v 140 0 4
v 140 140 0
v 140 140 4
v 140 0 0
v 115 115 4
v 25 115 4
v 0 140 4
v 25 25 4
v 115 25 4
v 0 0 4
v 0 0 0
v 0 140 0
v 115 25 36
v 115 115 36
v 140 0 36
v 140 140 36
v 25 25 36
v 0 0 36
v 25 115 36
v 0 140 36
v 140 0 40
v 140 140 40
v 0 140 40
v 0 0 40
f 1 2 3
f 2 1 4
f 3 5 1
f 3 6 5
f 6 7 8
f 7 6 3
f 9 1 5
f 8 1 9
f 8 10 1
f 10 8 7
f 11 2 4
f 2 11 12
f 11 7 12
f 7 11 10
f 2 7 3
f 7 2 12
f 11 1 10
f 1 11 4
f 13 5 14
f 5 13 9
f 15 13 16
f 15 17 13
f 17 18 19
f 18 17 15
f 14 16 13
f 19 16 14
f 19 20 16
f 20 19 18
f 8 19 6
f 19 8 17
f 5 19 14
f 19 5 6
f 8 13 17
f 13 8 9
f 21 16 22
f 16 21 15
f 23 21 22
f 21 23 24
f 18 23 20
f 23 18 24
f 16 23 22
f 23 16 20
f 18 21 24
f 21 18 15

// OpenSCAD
$fn = 100;
board_size = 140;


cube([board_size,board_size,4]);


battery_out = [90,90,35];

difference(){
    translate([(board_size-battery_out[0])/2,(board_size-battery_out[1])/2,1]) cube(battery_out);
    
    battery_size = [20,66,22];
    

}

translate([0,0,36]) cube([board_size,board_size,4]);
